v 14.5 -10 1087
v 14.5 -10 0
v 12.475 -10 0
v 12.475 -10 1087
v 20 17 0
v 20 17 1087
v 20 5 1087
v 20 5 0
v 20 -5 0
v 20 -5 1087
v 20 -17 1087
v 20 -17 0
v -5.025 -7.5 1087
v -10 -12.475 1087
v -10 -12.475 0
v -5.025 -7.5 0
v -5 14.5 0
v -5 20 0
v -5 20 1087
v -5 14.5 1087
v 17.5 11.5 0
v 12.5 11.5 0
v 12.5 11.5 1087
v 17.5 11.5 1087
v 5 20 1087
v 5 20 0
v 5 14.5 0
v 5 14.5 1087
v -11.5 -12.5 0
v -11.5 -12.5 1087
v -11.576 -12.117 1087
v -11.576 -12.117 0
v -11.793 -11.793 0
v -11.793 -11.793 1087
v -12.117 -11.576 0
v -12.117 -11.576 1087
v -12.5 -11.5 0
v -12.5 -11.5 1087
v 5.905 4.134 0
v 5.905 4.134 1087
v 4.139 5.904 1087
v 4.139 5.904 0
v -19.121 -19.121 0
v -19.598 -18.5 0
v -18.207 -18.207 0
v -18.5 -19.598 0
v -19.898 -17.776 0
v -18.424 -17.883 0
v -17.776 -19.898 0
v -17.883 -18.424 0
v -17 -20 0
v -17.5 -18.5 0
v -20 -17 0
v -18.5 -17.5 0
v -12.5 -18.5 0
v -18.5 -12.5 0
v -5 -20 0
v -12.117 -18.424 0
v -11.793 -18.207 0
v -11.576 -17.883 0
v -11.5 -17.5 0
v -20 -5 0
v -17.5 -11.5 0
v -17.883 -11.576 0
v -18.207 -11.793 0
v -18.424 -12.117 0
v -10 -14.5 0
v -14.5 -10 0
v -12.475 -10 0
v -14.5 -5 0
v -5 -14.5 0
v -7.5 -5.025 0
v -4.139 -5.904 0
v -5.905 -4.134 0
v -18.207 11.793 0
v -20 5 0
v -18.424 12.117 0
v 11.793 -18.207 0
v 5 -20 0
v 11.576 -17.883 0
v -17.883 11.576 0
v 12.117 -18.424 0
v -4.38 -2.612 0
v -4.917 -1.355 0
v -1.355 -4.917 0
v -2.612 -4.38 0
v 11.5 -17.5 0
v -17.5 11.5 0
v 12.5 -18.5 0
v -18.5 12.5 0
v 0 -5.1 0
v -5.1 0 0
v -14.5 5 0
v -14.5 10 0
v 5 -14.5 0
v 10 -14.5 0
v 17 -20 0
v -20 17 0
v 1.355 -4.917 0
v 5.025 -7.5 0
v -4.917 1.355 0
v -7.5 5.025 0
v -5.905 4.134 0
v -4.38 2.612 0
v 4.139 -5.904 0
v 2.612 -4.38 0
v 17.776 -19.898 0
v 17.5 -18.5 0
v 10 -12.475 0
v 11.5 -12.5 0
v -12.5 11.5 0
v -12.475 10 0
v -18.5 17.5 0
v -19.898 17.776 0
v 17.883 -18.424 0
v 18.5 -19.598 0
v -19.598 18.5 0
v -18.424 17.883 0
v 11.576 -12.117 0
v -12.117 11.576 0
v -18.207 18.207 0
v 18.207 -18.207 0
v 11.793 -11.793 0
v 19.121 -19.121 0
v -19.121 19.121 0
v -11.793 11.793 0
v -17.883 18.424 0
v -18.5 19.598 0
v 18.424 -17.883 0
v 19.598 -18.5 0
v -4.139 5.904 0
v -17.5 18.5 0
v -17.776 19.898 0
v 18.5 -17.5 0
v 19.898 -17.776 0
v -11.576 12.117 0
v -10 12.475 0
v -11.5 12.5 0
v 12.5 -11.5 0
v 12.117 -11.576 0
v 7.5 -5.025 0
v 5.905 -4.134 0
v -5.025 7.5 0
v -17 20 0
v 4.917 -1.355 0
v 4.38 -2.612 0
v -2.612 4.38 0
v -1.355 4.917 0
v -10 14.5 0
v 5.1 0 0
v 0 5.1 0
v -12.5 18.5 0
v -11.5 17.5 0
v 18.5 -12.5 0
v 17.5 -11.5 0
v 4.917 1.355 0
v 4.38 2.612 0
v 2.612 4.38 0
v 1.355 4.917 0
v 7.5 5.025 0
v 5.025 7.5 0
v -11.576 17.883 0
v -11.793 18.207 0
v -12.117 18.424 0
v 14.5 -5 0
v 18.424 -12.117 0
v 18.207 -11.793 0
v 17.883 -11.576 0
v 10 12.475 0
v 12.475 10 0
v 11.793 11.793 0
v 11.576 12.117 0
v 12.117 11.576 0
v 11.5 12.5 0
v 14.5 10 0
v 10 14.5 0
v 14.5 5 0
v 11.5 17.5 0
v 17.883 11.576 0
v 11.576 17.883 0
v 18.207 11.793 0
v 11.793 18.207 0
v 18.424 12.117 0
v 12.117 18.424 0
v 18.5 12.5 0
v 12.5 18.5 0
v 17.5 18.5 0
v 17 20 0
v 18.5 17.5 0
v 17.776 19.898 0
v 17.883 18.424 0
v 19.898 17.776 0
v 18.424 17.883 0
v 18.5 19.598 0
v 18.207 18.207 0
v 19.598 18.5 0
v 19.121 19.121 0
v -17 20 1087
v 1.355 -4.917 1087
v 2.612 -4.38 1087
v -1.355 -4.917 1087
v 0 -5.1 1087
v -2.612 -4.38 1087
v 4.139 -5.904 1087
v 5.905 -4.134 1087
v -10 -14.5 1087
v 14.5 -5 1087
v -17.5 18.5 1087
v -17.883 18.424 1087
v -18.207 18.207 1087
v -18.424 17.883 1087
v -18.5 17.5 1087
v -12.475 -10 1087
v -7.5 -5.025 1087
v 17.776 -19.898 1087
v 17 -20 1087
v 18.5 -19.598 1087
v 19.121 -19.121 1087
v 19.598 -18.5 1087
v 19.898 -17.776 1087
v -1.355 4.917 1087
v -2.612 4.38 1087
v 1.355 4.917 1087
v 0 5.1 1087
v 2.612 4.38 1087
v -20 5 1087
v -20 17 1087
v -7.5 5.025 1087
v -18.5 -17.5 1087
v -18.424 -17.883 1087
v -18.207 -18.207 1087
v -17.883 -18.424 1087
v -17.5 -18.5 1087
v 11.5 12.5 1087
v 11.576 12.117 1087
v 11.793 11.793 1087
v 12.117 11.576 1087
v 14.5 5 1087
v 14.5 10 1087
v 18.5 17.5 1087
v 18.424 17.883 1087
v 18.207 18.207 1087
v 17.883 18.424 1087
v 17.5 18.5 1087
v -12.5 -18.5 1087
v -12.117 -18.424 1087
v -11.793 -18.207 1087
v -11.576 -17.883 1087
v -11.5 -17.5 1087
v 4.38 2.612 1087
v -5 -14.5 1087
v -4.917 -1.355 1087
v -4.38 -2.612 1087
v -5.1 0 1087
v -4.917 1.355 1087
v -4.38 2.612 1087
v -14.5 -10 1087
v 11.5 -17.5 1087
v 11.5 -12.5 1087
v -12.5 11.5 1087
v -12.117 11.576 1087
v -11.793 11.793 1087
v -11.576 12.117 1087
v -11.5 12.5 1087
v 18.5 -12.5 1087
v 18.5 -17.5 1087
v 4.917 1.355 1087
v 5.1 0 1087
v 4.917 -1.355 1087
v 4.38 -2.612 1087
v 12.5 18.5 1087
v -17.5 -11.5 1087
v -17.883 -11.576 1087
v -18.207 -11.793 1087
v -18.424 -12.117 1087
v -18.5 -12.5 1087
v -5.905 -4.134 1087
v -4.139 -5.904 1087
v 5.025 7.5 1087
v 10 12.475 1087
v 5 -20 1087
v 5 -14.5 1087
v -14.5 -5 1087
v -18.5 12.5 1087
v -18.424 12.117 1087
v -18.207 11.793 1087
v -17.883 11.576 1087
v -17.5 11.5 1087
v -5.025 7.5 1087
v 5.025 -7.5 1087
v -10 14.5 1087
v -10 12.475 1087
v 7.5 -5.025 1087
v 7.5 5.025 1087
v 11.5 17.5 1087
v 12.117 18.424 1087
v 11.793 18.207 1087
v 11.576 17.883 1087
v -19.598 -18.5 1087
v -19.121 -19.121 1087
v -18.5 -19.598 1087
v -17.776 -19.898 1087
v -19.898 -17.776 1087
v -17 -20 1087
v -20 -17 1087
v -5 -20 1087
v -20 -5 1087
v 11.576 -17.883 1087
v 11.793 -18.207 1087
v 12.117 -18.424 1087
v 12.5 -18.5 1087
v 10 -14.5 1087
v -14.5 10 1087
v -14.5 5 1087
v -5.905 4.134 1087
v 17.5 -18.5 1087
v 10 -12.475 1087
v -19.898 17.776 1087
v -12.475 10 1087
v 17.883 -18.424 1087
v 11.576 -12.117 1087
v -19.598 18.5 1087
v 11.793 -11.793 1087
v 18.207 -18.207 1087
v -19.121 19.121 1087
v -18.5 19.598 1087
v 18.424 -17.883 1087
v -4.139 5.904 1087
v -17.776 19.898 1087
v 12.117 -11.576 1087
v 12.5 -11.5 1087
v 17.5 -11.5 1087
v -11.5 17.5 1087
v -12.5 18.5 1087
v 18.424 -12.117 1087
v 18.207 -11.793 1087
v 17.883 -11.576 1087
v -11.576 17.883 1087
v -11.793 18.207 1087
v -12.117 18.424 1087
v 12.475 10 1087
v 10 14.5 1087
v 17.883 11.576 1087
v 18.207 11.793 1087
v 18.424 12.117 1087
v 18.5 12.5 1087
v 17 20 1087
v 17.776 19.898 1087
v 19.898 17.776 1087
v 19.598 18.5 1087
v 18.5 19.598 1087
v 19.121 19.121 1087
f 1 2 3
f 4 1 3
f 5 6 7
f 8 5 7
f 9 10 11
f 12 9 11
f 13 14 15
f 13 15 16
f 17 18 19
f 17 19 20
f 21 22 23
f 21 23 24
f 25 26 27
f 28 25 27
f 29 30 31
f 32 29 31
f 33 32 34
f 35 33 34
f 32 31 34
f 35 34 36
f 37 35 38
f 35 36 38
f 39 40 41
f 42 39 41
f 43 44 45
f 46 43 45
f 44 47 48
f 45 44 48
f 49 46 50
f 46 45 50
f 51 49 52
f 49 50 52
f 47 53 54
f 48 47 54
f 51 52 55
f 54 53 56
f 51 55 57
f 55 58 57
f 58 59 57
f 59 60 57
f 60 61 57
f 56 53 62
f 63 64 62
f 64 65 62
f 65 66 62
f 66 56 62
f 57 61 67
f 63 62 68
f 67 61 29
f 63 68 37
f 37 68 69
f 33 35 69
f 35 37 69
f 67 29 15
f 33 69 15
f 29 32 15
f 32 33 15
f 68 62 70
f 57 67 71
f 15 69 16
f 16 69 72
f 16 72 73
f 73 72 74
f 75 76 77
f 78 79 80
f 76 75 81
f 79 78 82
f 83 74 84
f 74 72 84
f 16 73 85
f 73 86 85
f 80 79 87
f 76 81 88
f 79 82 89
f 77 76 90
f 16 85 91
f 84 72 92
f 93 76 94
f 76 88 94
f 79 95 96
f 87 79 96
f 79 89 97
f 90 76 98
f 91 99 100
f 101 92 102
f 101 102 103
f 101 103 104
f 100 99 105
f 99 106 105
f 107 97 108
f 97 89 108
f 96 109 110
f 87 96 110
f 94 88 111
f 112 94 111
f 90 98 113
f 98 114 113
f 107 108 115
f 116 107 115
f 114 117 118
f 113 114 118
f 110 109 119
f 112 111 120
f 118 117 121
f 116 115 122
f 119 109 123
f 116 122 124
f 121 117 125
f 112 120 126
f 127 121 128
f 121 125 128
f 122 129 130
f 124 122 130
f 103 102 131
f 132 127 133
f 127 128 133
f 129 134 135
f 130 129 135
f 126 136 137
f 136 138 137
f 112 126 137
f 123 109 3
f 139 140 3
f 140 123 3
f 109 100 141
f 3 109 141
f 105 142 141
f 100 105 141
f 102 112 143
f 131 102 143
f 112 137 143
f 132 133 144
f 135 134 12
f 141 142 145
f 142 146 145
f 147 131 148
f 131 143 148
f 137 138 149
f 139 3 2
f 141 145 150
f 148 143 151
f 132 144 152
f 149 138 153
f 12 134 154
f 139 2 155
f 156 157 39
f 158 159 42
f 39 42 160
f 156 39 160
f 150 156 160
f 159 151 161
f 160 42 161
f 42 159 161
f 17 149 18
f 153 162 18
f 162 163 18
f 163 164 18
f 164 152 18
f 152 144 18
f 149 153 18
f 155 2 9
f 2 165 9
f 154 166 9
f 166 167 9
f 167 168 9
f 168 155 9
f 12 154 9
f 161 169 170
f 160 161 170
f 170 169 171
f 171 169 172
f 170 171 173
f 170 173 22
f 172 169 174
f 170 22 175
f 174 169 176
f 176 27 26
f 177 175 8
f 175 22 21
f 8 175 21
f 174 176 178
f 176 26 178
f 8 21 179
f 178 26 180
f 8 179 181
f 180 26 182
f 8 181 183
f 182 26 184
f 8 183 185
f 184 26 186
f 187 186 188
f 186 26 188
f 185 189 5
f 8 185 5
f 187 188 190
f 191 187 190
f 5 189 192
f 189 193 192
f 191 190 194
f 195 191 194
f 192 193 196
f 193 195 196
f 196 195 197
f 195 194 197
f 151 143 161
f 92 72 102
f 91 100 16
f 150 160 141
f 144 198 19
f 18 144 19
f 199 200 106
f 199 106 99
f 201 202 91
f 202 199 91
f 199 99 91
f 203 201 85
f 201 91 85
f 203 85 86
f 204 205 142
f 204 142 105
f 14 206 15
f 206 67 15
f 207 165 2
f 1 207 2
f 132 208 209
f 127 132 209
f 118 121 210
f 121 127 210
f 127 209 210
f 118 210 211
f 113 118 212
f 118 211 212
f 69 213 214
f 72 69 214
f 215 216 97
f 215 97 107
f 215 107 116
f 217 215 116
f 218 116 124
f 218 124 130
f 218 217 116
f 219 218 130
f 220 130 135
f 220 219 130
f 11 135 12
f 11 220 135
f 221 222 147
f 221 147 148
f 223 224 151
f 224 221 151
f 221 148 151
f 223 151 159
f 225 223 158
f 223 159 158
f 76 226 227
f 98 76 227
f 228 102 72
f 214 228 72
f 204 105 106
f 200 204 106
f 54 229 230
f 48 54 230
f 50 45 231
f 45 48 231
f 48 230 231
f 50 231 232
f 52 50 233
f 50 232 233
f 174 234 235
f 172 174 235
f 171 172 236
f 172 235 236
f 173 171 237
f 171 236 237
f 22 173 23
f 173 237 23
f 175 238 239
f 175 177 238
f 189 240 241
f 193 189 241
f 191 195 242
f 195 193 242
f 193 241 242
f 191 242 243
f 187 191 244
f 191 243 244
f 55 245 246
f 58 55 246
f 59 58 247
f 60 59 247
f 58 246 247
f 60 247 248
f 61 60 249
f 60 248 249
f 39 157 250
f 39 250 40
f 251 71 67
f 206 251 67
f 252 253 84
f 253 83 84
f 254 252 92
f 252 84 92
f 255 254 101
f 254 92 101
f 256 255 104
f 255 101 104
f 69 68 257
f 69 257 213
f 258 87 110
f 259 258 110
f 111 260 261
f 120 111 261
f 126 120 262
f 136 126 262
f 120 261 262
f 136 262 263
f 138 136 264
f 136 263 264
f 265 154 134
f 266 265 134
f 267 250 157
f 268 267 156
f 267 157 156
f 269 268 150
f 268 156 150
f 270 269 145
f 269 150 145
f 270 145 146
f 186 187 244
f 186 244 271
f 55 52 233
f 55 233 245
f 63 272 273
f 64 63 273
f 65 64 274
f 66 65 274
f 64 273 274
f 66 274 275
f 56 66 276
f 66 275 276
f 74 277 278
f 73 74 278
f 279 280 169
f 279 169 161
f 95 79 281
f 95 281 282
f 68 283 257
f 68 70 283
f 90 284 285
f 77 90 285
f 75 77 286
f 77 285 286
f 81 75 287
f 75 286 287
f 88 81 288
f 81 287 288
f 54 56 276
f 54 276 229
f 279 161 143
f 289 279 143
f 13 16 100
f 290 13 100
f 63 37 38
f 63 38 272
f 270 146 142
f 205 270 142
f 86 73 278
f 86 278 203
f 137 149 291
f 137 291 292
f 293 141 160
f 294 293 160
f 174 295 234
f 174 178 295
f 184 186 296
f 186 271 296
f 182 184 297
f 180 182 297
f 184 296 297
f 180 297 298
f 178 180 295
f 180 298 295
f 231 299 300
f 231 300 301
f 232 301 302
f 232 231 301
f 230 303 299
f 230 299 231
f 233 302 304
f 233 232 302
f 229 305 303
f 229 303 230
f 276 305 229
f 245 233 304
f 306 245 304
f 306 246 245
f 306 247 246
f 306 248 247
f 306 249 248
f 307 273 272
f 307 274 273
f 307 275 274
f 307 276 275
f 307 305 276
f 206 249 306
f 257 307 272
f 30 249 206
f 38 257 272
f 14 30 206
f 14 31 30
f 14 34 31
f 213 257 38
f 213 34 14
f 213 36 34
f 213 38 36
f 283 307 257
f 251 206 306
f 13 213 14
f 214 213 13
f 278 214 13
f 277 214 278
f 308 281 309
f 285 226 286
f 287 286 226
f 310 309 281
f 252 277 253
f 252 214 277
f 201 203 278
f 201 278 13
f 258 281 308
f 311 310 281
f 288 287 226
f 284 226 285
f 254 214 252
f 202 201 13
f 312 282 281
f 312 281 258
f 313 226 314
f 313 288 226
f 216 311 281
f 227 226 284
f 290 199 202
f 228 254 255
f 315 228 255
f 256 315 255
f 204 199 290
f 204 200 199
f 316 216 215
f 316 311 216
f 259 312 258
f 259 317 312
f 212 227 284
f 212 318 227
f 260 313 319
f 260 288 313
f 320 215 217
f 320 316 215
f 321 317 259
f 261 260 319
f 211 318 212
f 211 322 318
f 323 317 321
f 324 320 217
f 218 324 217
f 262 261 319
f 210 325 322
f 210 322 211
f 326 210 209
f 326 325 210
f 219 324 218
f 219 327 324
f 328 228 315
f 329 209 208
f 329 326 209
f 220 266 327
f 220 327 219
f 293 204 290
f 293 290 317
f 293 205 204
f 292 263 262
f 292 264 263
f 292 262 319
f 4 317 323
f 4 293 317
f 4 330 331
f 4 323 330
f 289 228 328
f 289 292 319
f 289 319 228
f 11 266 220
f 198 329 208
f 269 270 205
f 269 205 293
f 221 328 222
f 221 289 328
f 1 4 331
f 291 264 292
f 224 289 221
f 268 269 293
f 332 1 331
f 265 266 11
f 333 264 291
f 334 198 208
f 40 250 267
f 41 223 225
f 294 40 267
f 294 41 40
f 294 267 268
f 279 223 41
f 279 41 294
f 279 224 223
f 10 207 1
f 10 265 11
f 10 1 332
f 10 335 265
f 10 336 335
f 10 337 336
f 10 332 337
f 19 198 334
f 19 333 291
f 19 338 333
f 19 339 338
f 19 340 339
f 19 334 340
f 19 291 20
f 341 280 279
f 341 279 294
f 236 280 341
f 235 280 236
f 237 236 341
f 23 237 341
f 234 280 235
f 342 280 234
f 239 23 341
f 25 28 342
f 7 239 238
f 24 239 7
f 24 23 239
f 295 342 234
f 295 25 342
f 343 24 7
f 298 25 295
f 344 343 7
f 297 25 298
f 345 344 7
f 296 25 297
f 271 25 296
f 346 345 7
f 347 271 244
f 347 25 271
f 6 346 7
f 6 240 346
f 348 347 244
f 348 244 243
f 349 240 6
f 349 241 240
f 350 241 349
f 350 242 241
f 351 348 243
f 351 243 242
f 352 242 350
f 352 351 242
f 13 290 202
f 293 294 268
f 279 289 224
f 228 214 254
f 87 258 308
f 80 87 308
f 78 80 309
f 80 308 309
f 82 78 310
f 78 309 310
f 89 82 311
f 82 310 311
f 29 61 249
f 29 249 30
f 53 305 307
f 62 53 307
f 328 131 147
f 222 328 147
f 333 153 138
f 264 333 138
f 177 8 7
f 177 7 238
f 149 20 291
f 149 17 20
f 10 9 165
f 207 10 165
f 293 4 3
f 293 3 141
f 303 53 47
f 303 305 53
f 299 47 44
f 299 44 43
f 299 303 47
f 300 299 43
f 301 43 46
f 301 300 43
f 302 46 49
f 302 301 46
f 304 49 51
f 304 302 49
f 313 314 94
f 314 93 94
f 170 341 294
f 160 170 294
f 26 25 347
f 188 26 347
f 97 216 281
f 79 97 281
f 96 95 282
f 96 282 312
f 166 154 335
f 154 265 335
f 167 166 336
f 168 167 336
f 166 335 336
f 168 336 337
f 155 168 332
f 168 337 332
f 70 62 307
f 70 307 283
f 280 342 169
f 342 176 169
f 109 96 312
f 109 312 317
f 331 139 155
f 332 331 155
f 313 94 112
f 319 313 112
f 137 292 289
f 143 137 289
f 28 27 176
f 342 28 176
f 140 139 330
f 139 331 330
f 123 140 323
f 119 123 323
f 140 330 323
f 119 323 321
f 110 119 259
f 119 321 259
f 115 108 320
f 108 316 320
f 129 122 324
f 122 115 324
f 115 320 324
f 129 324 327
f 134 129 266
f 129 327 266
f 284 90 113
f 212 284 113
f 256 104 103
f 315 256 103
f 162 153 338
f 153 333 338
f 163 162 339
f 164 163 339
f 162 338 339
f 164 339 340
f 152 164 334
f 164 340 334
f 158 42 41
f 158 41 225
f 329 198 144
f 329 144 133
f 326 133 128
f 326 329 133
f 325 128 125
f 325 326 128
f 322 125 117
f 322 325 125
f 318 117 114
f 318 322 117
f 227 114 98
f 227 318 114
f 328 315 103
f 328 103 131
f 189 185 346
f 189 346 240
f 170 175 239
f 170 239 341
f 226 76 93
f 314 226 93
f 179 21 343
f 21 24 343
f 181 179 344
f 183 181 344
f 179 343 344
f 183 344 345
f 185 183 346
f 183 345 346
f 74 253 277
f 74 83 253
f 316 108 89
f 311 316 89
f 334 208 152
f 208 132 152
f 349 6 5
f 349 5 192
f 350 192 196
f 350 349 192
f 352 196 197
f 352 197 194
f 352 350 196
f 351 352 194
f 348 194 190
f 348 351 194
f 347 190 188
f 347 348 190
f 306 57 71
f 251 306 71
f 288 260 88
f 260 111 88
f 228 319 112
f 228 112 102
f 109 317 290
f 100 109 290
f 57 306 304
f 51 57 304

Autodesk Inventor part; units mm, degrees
ref_plane "YZ Plane" through (0, 0, 0) normal (1, 0, 0) x (0, 1, 0)
ref_plane "XZ Plane" through (0, 0, 0) normal (0, 1, 0) x (-1, 0, 0)
ref_plane "XY Plane" through (0, 0, 0) normal (0, 0, 1) x (1, 0, 0)
sketch "T-Slot 4040 Base" plane through (0, 0, 0) normal (0, 0, 1) x (1, 0, 0)
  line L0 (-28, 0) -> (28, 0) construction
  line L1 (0, -28) -> (0, 28) construction
  circle A0 centre (0, 0) radius 5.1
  line L2 (-7.5, -7.5) -> (7.5, -7.5)
  line L3 (7.5, -7.5) -> (7.5, 7.5)
  line L4 (7.5, 7.5) -> (-7.5, 7.5)
  line L5 (-7.5, 7.5) -> (-7.5, -7.5)
  line L6 (-7.5, -7.5) -> (7.5, 7.5) construction
  line L7 (7.5, -7.5) -> (-7.5, 7.5) construction
  line L8 (-20, 20) -> (20, 20)
  line L9 (20, 20) -> (20, -20)
  line L10 (20, -20) -> (-20, -20)
  line L11 (-20, -20) -> (-20, 20)
  line L12 (-20, 20) -> (20, -20) construction
  line L13 (20, 20) -> (-20, -20) construction
  line L14 (20, 5) -> (14.5, 5)
  line L15 (14.5, 5) -> (14.5, 10)
  line L16 (14.5, 10) -> (12.4749, 10)
  line L17 (12.4749, 10) -> (7.5, 5.0251)
  line L18 (5, 20) -> (5, 14.5)
  line L19 (5, 14.5) -> (10, 14.5)
  line L20 (10, 14.5) -> (10, 12.4749)
  line L21 (10, 12.4749) -> (5.0251, 7.5)
  line L22 (18.5, 18.5) -> (11.5, 18.5)
  line L23 (11.5, 18.5) -> (11.5, 11.5)
  line L24 (11.5, 11.5) -> (18.5, 11.5)
  line L25 (18.5, 11.5) -> (18.5, 18.5)
  line L26 (18.5, 18.5) -> (11.5, 11.5) construction
  line L27 (11.5, 18.5) -> (18.5, 11.5) construction
  line L28 (3.0732, 1.3088) -> (4.38, 2.6125) construction
  line L29 (5.905, 4.1338) -> (4.1393, 5.9037)
  line L30 (4.1393, 5.9037) -> (2.6122, 4.3802)
  line L31 (1.3075, 3.0787) -> (3.0732, 1.3088) construction
  line L32 (3.0732, 1.3088) -> (4.1393, 5.9037) construction
  line L33 (5.905, 4.1338) -> (1.3075, 3.0787) construction
  line L34 (4.38, 2.6125) -> (5.905, 4.1338)
  line L35 (2.6122, 4.3802) -> (1.3075, 3.0787) construction
  line L36 (-20, 5) -> (-14.5, 5)
  line L37 (-14.5, 5) -> (-14.5, 10)
  line L38 (-14.5, 10) -> (-12.4749, 10)
  line L39 (-12.4749, 10) -> (-7.5, 5.0251)
  line L40 (-5, 20) -> (-5, 14.5)
  line L41 (-5, 14.5) -> (-10, 14.5)
  line L42 (-10, 14.5) -> (-10, 12.4749)
  line L43 (-10, 12.4749) -> (-5.0251, 7.5)
  line L44 (-18.5, 18.5) -> (-11.5, 18.5)
  line L45 (-11.5, 18.5) -> (-11.5, 11.5)
  line L46 (-11.5, 11.5) -> (-18.5, 11.5)
  line L47 (-18.5, 11.5) -> (-18.5, 18.5)
  line L48 (-5.905, 4.1338) -> (-4.1393, 5.9037)
  line L49 (-4.1393, 5.9037) -> (-2.6122, 4.3802)
  line L50 (-4.38, 2.6125) -> (-5.905, 4.1338)
  line L51 (7.5, -7.5) -> (-7.5, -7.5)
  line L52 (20, -5) -> (14.5, -5)
  line L53 (14.5, -5) -> (14.5, -10)
  line L54 (14.5, -10) -> (12.4749, -10)
  line L55 (12.4749, -10) -> (7.5, -5.0251)
  line L56 (5, -20) -> (5, -14.5)
  line L57 (5, -14.5) -> (10, -14.5)
  line L58 (10, -14.5) -> (10, -12.4749)
  line L59 (10, -12.4749) -> (5.0251, -7.5)
  line L60 (18.5, -18.5) -> (11.5, -18.5)
  line L61 (11.5, -18.5) -> (11.5, -11.5)
  line L62 (11.5, -11.5) -> (18.5, -11.5)
  line L63 (18.5, -11.5) -> (18.5, -18.5)
  line L64 (18.5, -18.5) -> (11.5, -11.5) construction
  line L65 (11.5, -18.5) -> (18.5, -11.5) construction
  line L66 (3.0732, -1.3088) -> (4.38, -2.6125) construction
  line L67 (5.905, -4.1338) -> (4.1393, -5.9037)
  line L68 (4.1393, -5.9037) -> (2.6122, -4.3802)
  line L69 (1.3075, -3.0787) -> (3.0732, -1.3088) construction
  line L70 (3.0732, -1.3088) -> (4.1393, -5.9037) construction
  line L71 (5.905, -4.1338) -> (1.3075, -3.0787) construction
  line L72 (4.38, -2.6125) -> (5.905, -4.1338)
  line L73 (2.6122, -4.3802) -> (1.3075, -3.0787) construction
  line L74 (-4.38, -2.6125) -> (-5.905, -4.1338)
  line L75 (-4.1393, -5.9037) -> (-2.6122, -4.3802)
  line L76 (-5.905, -4.1338) -> (-4.1393, -5.9037)
  line L77 (-12.4749, -10) -> (-7.5, -5.0251)
  line L78 (-10, -12.4749) -> (-5.0251, -7.5)
  line L79 (-10, -14.5) -> (-10, -12.4749)
  line L80 (-5, -14.5) -> (-10, -14.5)
  line L81 (-5, -20) -> (-5, -14.5)
  line L82 (-18.5, -18.5) -> (-11.5, -18.5)
  line L83 (-11.5, -18.5) -> (-11.5, -11.5)
  line L84 (-11.5, -11.5) -> (-18.5, -11.5)
  line L85 (-18.5, -11.5) -> (-18.5, -18.5)
  line L86 (-14.5, -10) -> (-12.4749, -10)
  line L87 (-14.5, -5) -> (-14.5, -10)
  line L88 (-20, -5) -> (-14.5, -5)
  point P0 (15, 15)
  point P1 (3.6062, 3.6062)
  point P2 (3.6062, 3.6062)
  point P3 (15, -15)
  point P4 (3.6062, -3.6062)
  point P5 (3.6062, -3.6062)
  dimension "d9" = 10.2
  dimension "d12" = 40
  dimension "d13" = 40
  dimension "d14" = 5.5
  dimension "d15" = 15
  dimension "d16" = 7
  dimension "d17" = 10
  dimension "d20" = 1.75
  dimension "d21" = 7
  dimension "d22" = 2
  dimension "d29" = 1.5
  dimension "d30" = 2.5
extrude "Extrusion1" add sketch "T-Slot 4040 Base" along normal blind 1087 contours L5 L4 L3 L2 | L2 L78 L79 L80 L81 L10 L11 L88 L87 L86 L77 L5 | L2 L3 L55 L54 L53 L52 L9 L10 L56 L57 L58 L59 | L39 L38 L37 L36 L11 L8 L40 L41 L42 L43 L4 L5 | L3 L4 L21 L20 L19 L18 L8 L9 L14 L15 L16 L17
fillet "Rundung1" radius 1 16 edges at (11.5, 18.5, 543.5) (18.5, 18.5, 543.5) (18.5, 11.5, 543.5) (11.5, 11.5, 543.5) (-11.5, 18.5, 543.5) (-18.5, 18.5, 543.5) (-18.5, 11.5, 543.5) (-11.5, 11.5, 543.5) (-18.5, -11.5, 543.5) (-11.5, -11.5, 543.5) (-11.5, -18.5, 543.5) (-18.5, -18.5, 543.5) (11.5, -18.5, 543.5) (11.5, -11.5, 543.5) (18.5, -11.5, 543.5) (18.5, -18.5, 543.5)
fillet "Rundung2" radius 3 4 edges at (20, 20, 543.5) (20, -20, 543.5) (-20, -20, 543.5) (-20, 20, 543.5)
properties part number "T-SLOT 4040 B-Type 1087mm"
